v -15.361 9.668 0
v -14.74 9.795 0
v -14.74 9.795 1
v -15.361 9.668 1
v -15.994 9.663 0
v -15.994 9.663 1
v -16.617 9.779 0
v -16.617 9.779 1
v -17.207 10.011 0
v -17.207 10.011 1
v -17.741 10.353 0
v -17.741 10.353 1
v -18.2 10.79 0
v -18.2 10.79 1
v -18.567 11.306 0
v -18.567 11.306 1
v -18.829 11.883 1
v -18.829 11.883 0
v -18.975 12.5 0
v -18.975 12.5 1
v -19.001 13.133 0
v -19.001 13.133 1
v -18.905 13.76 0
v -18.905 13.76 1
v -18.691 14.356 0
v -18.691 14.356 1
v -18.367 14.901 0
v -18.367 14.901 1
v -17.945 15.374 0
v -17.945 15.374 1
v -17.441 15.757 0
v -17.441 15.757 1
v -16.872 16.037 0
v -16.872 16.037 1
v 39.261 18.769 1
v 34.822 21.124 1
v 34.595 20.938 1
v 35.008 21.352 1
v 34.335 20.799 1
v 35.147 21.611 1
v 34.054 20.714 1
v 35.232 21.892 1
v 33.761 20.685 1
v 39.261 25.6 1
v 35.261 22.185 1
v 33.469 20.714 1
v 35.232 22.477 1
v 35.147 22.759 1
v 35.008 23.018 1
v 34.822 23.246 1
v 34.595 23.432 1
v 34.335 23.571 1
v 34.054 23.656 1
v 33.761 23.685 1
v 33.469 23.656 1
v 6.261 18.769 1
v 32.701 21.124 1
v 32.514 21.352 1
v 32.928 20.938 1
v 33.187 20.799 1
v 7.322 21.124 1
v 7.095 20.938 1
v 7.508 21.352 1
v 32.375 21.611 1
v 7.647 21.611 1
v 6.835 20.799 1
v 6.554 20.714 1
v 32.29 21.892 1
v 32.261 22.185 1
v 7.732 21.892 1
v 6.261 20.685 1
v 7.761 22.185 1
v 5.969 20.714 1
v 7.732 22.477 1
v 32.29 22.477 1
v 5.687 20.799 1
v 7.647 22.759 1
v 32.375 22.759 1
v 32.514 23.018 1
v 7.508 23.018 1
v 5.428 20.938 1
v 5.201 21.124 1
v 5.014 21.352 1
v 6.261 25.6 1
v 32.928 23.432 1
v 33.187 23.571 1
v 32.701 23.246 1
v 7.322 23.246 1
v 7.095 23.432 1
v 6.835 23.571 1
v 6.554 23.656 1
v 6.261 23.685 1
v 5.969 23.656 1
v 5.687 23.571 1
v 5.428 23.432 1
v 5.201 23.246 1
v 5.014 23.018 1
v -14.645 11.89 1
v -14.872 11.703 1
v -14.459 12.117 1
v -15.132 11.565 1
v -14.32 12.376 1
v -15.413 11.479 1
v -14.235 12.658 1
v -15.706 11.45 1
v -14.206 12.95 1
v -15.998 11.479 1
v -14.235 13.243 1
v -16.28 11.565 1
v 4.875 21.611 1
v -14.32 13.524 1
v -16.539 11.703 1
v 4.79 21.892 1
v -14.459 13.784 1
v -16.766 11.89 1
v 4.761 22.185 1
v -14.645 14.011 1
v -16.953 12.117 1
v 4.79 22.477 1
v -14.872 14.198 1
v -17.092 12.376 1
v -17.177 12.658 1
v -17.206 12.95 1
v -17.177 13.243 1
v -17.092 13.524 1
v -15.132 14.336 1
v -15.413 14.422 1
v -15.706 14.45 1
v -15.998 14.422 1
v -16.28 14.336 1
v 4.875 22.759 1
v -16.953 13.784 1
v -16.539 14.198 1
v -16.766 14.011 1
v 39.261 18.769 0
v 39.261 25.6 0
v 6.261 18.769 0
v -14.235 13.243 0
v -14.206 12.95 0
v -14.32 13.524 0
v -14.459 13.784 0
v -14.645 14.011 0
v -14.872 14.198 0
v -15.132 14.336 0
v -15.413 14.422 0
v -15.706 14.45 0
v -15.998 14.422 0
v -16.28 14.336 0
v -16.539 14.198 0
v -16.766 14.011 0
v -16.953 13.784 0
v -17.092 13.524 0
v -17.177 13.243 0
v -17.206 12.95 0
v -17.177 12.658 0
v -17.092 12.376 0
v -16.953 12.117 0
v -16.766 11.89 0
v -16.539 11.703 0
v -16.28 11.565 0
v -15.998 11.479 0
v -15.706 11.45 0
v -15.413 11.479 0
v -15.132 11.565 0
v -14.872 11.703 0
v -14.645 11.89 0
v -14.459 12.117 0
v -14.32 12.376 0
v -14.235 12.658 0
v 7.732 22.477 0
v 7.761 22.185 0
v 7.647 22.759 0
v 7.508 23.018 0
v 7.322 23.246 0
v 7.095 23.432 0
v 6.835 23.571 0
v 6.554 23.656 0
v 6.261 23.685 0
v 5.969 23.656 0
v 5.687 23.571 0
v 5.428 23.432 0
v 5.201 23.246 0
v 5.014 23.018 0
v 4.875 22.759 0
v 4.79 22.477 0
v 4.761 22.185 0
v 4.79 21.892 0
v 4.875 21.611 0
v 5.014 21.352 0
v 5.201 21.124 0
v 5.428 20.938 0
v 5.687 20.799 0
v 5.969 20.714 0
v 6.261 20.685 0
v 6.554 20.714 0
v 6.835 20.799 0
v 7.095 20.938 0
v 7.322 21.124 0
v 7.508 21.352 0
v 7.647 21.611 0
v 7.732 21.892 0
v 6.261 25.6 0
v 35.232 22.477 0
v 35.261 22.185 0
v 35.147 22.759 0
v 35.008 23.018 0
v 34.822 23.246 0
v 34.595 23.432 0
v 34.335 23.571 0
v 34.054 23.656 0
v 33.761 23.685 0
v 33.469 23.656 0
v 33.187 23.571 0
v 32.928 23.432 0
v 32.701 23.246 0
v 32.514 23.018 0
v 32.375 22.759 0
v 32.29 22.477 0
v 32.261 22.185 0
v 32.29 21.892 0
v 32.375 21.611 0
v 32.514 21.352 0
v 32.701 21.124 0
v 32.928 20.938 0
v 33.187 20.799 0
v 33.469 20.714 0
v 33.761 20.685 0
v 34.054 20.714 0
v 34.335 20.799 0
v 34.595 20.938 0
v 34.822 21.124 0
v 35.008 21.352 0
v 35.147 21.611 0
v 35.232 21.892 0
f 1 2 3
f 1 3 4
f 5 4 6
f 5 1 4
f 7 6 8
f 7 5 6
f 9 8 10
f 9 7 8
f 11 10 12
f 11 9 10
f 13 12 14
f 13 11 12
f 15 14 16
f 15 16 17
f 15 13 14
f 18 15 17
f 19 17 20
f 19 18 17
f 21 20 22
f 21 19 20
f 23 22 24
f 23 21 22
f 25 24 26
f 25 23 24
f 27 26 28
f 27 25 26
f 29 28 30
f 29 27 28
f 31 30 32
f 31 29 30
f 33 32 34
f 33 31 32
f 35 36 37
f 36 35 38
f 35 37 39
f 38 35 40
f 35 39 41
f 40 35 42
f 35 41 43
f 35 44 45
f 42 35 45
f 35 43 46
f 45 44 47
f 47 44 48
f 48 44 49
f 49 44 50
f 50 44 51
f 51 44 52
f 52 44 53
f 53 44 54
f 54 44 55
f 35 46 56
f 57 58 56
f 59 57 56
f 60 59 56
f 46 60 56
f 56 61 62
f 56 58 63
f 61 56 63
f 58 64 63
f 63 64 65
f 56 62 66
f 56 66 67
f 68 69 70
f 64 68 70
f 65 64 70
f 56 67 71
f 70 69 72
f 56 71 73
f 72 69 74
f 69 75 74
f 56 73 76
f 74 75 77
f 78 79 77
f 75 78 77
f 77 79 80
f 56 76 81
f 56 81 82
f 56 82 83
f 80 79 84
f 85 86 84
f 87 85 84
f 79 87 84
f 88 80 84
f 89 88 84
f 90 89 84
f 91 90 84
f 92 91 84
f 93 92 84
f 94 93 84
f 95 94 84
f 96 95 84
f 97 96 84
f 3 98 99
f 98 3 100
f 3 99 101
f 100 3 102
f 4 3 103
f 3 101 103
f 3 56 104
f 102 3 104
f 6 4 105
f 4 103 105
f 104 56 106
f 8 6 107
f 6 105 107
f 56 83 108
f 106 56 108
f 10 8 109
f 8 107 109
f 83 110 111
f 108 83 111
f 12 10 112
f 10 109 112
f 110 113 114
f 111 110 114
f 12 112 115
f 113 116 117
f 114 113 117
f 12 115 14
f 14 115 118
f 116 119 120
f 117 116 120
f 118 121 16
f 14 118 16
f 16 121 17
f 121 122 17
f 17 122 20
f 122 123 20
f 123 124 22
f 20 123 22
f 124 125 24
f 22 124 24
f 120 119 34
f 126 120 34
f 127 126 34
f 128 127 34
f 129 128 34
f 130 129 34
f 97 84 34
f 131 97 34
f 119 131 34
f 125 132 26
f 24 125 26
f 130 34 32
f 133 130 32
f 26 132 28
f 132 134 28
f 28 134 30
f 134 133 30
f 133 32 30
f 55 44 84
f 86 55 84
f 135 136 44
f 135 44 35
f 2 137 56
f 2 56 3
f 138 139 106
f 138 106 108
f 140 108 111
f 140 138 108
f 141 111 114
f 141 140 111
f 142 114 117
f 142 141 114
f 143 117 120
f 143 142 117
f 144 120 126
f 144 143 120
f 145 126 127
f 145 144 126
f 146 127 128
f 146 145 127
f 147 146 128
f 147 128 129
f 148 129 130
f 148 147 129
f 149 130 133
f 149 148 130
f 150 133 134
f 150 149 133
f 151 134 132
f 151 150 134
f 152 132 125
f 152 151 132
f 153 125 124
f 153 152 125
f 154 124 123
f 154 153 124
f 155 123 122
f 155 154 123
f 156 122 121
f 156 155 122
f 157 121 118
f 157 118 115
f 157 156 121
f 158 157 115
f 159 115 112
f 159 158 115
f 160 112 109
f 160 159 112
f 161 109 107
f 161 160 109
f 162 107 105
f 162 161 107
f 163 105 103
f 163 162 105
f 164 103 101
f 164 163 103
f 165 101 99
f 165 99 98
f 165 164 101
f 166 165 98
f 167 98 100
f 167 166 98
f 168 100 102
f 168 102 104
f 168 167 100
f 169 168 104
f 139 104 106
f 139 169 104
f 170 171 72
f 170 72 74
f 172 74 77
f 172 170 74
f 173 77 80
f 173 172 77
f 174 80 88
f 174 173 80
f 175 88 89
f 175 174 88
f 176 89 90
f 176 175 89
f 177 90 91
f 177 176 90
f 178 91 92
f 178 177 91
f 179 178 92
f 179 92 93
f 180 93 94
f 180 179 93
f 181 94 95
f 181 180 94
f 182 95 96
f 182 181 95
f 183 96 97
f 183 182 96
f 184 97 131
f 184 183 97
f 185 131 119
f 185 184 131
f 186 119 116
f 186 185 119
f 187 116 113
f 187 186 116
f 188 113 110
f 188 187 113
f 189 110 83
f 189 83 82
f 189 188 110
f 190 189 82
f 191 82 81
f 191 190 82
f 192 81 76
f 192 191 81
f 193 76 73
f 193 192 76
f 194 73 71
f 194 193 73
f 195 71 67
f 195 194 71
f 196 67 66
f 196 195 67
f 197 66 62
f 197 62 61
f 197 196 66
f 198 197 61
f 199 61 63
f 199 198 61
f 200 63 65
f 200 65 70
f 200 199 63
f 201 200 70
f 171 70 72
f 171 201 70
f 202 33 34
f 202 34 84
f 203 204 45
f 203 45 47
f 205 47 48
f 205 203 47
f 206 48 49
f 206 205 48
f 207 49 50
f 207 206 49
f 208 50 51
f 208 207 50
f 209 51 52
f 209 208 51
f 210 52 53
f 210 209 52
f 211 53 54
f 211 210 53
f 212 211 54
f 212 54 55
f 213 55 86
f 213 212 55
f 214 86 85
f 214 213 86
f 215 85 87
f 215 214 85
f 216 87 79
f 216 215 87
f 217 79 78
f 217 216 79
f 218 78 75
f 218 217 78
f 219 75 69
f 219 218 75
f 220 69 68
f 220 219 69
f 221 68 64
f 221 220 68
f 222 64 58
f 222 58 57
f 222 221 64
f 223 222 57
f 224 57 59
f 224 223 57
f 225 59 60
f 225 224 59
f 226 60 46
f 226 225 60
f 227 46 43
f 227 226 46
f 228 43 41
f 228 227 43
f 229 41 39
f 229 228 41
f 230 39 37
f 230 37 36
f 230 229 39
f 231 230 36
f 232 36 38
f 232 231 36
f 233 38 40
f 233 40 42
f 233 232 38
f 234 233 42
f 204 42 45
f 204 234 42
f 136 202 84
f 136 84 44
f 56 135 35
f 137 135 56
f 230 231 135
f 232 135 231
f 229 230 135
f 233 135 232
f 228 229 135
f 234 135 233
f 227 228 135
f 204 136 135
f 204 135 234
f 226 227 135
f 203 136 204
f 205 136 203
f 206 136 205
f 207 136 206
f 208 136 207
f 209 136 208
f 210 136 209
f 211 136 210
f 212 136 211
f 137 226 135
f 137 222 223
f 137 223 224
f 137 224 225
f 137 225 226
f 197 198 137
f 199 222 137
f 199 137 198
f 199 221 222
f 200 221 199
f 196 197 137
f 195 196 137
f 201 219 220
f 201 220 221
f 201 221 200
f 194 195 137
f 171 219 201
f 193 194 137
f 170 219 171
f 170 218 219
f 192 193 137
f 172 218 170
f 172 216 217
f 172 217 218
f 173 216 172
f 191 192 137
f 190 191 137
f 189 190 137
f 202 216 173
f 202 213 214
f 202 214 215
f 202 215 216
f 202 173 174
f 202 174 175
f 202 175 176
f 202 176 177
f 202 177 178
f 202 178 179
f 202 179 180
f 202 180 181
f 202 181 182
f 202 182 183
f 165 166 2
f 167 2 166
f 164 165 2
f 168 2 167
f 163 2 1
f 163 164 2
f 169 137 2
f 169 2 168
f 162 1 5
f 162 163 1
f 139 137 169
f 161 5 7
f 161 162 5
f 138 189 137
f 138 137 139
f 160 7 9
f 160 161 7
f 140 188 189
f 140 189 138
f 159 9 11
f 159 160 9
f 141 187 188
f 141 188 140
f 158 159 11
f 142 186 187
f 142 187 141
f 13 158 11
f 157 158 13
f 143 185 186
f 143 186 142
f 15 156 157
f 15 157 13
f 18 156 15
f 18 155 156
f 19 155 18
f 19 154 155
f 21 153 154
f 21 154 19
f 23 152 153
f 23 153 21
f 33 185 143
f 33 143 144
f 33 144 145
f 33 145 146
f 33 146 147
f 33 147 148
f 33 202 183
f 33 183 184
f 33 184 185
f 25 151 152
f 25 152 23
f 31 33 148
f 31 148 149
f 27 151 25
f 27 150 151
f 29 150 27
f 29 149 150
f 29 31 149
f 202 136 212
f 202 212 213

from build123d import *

# Parameters (mm, degrees)
MODEL_R                 = 1.5
SALIENTE_EXTRUIR1_DEPTH = 1


with BuildPart() as part:
    # Model → Saliente-Extruir1 (new body)
    with BuildSketch(Plane.XY):
        with BuildLine():
            Line((6.261217919, 18.769360839), (-14.739513879, 9.794996238))
            ThreePointArc((-14.739513879, 9.794996238), (-18.828558612, 11.883464999), (-16.872209477, 16.037341099))
            Line((-16.872209477, 16.037341099), (6.261217919, 25.600360839))
            Line((6.261217919, 25.600360839), (39.261217919, 25.600360839))
            Line((39.261217919, 25.600360839), (39.261217919, 18.769360839))
            Line((39.261217919, 18.769360839), (6.261217919, 18.769360839))
        make_face()
        with Locations((33.761217919, 22.184860839)):
            Circle(MODEL_R, mode=Mode.SUBTRACT)
        with Locations((6.261217919, 22.184860839)):
            Circle(MODEL_R, mode=Mode.SUBTRACT)
        with Locations((-15.705782081, 12.950360839)):
            Circle(MODEL_R, mode=Mode.SUBTRACT)
    extrude(amount=SALIENTE_EXTRUIR1_DEPTH)


solid = part.part
